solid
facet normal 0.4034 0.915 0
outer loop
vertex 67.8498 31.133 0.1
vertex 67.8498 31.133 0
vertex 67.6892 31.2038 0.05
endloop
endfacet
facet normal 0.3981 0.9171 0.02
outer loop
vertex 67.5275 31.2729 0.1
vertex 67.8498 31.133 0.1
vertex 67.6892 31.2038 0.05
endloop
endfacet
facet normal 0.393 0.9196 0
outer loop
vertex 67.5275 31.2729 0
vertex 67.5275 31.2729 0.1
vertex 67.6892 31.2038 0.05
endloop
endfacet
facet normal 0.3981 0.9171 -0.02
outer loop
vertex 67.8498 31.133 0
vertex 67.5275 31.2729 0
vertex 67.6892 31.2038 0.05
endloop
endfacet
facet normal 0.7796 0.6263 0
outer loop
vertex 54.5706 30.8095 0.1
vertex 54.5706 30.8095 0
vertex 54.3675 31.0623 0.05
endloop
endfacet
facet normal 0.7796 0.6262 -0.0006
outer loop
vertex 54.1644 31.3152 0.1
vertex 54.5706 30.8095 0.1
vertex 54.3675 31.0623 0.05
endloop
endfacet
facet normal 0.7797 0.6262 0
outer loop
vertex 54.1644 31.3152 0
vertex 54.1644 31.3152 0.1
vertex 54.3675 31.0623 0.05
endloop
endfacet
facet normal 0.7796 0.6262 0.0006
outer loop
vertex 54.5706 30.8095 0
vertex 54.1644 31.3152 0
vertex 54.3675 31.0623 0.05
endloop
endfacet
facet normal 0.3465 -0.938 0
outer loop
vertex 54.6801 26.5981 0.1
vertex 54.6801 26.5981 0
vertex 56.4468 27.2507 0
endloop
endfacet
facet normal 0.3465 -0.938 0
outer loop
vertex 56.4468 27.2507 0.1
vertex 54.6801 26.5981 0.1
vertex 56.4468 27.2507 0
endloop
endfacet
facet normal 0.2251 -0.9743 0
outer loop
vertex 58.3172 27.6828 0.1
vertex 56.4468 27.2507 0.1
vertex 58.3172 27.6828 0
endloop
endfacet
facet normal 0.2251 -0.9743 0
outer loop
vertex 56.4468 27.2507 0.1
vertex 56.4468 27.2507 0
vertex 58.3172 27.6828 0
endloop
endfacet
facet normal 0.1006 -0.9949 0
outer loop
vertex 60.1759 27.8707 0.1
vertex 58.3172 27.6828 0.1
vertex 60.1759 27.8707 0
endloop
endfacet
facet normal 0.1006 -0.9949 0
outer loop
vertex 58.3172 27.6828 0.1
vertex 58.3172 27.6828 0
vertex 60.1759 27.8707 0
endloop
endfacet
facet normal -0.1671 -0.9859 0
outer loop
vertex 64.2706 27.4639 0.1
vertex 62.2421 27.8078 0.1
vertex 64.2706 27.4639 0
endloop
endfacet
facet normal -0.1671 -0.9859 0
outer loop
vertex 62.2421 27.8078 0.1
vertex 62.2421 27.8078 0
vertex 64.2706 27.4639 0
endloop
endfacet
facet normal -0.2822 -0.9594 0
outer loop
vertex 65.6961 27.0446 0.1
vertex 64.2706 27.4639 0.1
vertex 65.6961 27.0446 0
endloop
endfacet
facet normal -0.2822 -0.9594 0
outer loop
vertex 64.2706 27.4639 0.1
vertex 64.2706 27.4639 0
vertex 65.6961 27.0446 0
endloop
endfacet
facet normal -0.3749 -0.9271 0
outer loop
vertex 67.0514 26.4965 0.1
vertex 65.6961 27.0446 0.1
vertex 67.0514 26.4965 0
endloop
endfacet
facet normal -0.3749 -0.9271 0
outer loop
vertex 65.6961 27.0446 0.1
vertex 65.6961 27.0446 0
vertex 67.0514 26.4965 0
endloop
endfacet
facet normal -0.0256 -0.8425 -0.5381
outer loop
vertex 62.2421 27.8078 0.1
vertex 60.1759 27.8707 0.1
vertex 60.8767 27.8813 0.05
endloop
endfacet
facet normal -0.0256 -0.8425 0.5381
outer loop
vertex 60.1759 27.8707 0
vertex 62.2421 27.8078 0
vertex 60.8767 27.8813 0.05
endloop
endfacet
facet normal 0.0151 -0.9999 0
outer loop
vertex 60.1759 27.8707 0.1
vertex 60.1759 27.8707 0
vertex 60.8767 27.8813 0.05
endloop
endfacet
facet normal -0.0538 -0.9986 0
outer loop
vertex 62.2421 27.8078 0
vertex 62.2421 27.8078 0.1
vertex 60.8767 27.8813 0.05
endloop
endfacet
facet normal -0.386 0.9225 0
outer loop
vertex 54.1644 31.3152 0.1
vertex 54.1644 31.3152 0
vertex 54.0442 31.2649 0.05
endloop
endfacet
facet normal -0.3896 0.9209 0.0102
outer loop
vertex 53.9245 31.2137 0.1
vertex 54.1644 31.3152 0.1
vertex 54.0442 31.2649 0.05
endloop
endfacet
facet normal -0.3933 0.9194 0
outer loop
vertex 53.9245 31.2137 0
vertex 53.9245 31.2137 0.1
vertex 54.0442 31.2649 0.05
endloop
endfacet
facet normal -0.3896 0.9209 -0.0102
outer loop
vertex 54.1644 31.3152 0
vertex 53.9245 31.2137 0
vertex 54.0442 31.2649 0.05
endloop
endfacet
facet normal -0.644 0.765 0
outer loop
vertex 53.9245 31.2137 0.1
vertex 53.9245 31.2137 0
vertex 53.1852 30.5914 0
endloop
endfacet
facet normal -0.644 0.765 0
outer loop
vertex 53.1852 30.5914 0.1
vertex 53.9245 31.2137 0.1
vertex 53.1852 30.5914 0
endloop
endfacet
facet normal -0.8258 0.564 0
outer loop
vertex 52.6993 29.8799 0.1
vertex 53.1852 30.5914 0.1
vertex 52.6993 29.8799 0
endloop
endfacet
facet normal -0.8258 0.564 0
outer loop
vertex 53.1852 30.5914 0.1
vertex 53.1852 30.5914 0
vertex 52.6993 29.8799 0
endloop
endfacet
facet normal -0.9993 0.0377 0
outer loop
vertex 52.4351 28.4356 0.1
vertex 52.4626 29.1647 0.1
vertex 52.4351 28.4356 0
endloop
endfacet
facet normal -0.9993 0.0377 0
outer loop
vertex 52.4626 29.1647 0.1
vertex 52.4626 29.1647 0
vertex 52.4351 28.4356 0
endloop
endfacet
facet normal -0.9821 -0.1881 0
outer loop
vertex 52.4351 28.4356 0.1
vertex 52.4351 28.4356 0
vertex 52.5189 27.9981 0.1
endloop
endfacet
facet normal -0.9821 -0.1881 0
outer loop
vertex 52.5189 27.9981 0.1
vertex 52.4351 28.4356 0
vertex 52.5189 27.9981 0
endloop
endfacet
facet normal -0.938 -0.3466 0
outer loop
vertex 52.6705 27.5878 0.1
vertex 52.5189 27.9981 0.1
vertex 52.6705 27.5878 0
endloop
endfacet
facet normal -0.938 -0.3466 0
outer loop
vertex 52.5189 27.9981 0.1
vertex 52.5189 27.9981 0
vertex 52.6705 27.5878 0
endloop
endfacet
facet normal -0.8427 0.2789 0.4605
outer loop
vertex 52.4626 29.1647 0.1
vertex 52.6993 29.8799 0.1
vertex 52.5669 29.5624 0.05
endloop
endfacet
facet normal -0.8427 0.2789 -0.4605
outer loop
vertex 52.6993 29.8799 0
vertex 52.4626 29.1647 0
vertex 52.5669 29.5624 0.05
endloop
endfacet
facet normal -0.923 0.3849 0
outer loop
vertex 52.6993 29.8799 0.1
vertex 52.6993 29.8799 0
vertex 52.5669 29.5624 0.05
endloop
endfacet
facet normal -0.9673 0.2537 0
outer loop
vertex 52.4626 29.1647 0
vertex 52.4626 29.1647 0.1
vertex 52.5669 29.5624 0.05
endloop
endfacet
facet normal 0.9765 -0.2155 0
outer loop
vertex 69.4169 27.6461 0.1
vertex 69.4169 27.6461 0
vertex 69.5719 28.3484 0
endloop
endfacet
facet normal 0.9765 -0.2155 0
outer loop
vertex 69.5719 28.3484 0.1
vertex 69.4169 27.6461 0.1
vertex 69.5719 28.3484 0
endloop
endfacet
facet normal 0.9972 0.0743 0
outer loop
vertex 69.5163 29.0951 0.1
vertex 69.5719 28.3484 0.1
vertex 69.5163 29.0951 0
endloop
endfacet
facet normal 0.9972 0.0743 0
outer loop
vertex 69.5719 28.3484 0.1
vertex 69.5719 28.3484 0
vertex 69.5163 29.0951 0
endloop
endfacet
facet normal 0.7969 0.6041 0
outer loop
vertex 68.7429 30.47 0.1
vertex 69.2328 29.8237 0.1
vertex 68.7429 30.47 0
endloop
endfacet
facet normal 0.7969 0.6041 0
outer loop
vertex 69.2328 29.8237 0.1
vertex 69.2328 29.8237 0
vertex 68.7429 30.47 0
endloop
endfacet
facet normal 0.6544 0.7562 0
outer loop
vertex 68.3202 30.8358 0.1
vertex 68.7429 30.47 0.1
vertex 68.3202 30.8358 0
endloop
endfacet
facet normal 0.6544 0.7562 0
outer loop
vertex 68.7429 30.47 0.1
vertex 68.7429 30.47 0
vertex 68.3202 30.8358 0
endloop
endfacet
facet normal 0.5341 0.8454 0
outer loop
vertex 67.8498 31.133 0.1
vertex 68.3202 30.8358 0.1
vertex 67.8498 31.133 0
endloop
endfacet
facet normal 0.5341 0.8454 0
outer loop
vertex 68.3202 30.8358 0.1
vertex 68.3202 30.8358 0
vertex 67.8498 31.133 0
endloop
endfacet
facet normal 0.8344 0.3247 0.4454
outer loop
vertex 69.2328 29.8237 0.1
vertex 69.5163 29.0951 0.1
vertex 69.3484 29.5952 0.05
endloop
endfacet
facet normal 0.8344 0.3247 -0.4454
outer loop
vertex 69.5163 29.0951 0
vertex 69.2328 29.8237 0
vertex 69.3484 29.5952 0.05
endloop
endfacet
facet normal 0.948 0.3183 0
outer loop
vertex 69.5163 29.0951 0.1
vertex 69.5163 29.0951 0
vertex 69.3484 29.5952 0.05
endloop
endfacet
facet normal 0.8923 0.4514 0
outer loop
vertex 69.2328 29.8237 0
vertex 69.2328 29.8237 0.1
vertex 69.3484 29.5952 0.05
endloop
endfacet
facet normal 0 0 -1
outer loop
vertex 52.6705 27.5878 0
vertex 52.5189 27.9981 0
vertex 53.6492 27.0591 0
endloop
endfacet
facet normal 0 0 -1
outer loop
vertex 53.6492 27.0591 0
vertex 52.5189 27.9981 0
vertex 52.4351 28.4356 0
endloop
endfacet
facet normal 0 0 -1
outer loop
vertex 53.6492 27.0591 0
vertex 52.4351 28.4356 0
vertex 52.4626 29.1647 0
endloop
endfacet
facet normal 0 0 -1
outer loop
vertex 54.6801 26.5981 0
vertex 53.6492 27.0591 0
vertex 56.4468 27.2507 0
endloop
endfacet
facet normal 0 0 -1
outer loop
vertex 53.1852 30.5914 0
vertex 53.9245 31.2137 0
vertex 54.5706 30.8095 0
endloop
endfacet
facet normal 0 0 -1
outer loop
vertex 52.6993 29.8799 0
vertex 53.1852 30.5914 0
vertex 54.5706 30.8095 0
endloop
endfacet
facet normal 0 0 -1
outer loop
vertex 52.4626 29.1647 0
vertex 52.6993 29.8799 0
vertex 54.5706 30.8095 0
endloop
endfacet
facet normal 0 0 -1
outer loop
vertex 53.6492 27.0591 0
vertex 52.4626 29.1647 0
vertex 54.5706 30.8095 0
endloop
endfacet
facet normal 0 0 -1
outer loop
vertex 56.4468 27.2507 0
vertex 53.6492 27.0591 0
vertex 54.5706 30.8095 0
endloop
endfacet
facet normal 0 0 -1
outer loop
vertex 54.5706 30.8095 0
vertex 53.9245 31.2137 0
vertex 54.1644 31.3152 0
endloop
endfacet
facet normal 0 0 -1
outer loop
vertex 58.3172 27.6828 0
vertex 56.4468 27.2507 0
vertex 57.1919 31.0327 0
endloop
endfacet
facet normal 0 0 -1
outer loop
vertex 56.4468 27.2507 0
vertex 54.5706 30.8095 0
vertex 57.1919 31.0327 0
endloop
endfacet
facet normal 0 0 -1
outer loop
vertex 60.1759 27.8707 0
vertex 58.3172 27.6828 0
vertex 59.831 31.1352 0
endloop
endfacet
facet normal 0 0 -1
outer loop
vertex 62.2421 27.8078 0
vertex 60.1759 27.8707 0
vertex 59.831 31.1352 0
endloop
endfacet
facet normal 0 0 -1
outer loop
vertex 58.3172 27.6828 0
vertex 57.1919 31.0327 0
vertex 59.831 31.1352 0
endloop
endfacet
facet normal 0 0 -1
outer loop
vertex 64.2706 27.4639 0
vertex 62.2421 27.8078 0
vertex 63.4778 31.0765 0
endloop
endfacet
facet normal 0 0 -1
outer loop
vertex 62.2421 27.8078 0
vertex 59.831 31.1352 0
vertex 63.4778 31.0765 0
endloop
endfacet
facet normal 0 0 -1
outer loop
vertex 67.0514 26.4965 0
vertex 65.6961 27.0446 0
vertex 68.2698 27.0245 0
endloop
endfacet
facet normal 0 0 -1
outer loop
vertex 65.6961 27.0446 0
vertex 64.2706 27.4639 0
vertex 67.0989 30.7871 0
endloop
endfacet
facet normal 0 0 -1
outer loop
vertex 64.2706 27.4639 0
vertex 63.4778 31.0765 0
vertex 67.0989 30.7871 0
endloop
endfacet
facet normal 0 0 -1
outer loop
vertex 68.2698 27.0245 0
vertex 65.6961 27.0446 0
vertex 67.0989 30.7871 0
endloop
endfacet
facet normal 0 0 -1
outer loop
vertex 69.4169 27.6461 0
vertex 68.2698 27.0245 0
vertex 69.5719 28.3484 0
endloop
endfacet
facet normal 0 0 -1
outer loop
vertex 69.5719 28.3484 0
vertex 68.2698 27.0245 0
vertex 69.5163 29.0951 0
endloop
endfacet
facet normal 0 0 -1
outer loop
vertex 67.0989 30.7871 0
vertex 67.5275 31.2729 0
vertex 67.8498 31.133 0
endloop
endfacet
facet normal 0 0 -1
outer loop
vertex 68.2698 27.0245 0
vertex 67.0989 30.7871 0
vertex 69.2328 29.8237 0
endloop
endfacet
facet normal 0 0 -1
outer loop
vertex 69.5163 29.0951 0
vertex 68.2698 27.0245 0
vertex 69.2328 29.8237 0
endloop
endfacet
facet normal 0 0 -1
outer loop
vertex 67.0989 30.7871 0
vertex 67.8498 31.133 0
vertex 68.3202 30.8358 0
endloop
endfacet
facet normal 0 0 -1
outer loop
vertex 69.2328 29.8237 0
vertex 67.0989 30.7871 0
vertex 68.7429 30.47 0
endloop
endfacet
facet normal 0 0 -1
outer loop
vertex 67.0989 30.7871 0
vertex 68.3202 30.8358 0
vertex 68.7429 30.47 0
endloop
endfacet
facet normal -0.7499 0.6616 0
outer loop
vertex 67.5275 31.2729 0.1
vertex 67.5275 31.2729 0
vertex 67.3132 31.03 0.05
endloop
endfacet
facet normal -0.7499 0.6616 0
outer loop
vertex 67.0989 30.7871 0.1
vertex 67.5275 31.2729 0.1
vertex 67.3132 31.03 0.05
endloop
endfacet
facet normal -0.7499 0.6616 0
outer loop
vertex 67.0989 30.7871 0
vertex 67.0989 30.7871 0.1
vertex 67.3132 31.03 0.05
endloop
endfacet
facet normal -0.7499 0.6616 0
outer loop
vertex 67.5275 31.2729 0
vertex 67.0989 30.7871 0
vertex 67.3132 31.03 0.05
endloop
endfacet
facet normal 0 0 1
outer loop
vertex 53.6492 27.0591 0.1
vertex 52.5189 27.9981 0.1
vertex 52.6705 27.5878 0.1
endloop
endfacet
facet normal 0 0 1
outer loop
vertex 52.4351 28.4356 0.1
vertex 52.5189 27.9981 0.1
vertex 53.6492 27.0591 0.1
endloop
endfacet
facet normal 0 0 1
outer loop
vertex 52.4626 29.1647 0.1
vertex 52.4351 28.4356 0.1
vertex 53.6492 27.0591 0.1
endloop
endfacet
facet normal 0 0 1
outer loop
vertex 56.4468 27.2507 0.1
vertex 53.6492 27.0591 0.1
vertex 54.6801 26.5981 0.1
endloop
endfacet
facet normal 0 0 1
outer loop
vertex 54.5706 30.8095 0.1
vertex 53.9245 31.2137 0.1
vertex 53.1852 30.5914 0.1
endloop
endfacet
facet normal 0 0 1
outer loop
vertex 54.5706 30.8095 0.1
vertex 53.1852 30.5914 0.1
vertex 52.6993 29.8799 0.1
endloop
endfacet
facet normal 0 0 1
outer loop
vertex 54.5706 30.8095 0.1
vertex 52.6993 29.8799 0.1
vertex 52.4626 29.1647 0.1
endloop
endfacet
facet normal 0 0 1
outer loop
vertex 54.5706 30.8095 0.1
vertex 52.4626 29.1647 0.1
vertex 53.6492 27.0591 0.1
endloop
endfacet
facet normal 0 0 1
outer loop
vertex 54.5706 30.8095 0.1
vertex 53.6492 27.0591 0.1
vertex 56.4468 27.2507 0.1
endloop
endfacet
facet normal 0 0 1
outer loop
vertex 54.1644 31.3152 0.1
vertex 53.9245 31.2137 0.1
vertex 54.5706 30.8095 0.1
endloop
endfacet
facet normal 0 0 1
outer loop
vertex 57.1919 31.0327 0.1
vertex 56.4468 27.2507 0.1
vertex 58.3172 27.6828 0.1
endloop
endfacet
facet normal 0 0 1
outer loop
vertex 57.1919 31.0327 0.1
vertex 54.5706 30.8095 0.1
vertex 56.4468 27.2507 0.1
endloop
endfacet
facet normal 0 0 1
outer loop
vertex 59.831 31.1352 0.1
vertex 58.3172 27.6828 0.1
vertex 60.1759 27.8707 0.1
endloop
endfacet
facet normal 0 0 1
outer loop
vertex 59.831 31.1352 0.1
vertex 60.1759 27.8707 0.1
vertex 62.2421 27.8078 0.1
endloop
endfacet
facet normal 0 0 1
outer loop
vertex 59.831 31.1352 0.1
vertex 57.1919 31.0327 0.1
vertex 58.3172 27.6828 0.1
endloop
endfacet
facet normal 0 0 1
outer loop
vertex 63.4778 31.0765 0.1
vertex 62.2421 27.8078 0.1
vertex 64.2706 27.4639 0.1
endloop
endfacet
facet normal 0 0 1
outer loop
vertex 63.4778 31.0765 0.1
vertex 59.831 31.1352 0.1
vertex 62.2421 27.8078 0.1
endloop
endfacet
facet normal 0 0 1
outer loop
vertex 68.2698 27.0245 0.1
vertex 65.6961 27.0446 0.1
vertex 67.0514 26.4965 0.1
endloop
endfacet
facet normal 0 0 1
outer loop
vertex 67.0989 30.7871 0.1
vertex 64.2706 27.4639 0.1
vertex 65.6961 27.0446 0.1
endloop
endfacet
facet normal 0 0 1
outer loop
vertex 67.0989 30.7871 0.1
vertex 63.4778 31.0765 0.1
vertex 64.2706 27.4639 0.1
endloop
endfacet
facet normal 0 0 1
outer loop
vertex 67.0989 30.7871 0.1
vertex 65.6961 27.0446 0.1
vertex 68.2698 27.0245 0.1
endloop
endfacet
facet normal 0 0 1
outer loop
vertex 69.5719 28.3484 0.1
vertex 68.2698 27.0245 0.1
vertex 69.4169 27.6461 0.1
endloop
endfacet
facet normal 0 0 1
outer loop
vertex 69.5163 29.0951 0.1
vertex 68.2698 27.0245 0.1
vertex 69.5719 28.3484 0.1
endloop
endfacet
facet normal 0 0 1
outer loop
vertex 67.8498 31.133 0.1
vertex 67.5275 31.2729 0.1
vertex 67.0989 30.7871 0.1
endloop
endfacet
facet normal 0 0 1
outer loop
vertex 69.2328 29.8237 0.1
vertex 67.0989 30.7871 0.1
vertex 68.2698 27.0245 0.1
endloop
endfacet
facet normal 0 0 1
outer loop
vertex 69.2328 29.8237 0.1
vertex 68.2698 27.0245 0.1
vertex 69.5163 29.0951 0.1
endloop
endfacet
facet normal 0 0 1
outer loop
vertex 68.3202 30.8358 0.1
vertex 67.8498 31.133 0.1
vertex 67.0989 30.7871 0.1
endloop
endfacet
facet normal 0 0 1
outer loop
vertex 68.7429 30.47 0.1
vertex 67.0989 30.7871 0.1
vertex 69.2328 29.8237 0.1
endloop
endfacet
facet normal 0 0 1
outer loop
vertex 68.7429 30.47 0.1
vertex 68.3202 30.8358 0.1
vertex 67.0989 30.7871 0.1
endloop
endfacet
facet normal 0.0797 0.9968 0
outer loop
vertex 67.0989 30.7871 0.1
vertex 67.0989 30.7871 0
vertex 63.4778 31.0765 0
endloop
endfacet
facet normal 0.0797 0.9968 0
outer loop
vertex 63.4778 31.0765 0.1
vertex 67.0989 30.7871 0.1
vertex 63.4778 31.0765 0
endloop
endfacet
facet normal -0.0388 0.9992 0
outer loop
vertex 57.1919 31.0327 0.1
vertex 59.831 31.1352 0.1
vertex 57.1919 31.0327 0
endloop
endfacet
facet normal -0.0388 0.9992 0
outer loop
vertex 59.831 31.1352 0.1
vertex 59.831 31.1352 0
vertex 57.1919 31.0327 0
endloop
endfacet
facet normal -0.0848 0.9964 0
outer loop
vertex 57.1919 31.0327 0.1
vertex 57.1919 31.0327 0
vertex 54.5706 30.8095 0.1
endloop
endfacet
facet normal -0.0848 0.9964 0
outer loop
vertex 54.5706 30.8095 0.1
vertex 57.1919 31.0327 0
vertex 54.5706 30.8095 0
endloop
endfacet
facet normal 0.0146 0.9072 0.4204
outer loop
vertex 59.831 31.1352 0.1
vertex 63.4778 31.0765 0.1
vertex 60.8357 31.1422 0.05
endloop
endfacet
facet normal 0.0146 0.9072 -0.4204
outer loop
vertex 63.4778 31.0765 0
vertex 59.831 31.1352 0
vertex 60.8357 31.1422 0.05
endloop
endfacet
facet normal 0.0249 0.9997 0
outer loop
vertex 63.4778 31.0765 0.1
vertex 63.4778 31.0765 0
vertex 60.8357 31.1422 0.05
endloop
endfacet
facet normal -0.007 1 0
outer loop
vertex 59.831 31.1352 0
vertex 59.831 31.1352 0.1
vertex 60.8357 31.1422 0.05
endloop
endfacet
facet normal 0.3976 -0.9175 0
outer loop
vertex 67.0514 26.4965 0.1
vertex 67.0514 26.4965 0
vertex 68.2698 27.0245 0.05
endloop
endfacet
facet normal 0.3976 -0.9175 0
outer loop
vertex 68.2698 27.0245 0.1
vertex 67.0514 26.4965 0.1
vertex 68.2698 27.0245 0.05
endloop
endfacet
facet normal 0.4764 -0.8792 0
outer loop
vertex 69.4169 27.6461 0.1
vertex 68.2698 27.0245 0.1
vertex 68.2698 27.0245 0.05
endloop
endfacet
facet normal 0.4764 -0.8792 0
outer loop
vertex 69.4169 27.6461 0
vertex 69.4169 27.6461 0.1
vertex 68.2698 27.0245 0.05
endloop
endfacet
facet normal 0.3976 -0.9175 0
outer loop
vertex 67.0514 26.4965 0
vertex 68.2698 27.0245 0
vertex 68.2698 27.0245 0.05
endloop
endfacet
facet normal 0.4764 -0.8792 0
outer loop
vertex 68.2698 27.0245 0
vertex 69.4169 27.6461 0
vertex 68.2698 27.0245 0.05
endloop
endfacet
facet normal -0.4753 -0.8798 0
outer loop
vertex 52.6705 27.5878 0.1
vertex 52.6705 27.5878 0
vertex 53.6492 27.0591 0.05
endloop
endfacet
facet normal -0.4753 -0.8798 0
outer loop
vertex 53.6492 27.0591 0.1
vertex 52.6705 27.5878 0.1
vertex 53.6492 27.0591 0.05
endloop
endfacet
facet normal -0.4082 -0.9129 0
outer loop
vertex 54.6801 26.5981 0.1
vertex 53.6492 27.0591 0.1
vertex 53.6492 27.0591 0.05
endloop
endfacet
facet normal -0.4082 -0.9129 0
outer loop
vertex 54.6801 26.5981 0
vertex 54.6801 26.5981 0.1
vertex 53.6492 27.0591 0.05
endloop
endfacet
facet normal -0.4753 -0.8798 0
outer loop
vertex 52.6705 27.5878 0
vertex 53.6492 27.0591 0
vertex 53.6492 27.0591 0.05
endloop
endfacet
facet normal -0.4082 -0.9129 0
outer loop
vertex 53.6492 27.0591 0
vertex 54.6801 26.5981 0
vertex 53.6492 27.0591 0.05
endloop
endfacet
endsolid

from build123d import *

# Parameters (mm, degrees)
SALIENTE_EXTRUIR1_DEPTH = 0.1


with BuildPart() as part:
    # Model → Saliente-Extruir1 (new body)
    with BuildSketch(Plane.XY):
        with BuildLine():
            add(Edge.make_bspline(
                [(54.570583832, 30.809459397), (54.367516513, 31.062309536), (54.164449193, 31.315159675)],
                knots=[5.050094229, 5.050094229, 5.050094229, 6.050094229, 6.050094229, 6.050094229], degree=2, weights=[1, 1, 1]))
            add(Edge.make_bspline(
                [(54.164449193, 31.315159675), (54.043855277, 31.265315881), (53.924453385, 31.213668077)],
                knots=[0, 0, 0, 0.018791538, 0.018791538, 0.018791538], degree=2, weights=[1, 0.99995586, 1]))
            add(Edge.make_bspline(
                [(53.924453385, 31.213668077), (51.666875483, 29.761650164), (52.670517155, 27.587817765)],
                knots=[0.018791538, 0.018791538, 0.018791538, 1.266242996, 1.266242996, 1.266242996], degree=2, weights=[1, 0.811708033, 1]))
            add(Edge.make_bspline(
                [(52.670517155, 27.587817765), (53.62304942, 27.025028989), (54.680131861, 26.59810553)],
                knots=[1.266242996, 1.266242996, 1.266242996, 1.434861453, 1.434861453, 1.434861453], degree=2, weights=[1, 0.996448082, 1]))
            add(Edge.make_bspline(
                [(54.680131861, 26.59810553), (60.888771996, 29.345532705), (67.05144986, 26.496503052)],
                knots=[1.434861453, 1.434861453, 1.434861453, 2.28451346, 2.28451346, 2.28451346], degree=2, weights=[1, 0.911110461, 1]))
            add(Edge.make_bspline(
                [(67.05144986, 26.496503052), (68.305506812, 26.977392792), (69.416942944, 27.646101117)],
                knots=[2.28451346, 2.28451346, 2.28451346, 2.482363868, 2.482363868, 2.482363868], degree=2, weights=[1, 0.995110891, 1]))
            add(Edge.make_bspline(
                [(69.416942944, 27.646101117), (70.236120065, 29.850566621), (67.849759205, 31.132955517)],
                knots=[2.482363868, 2.482363868, 2.482363868, 3.750620329, 3.750620329, 3.750620329], degree=2, weights=[1, 0.805588504, 1]))
            add(Edge.make_bspline(
                [(67.849759205, 31.132955517), (67.689744673, 31.204586758), (67.527509068, 31.272945811)],
                knots=[3.750620329, 3.750620329, 3.750620329, 3.77600443, 3.77600443, 3.77600443], degree=2, weights=[1, 0.999919457, 1]))
            add(Edge.make_bspline(
                [(67.527509068, 31.272945811), (67.313211267, 31.030007557), (67.098913467, 30.787069303)],
                knots=[3.77600443, 3.77600443, 3.77600443, 4.77600443, 4.77600443, 4.77600443], degree=2, weights=[1, 1, 1]))
            add(Edge.make_bspline(
                [(67.098913467, 30.787069303), (60.836678527, 31.489373894), (54.570583832, 30.809459397)],
                knots=[4.77600443, 4.77600443, 4.77600443, 5.050094229, 5.050094229, 5.050094229], degree=2, weights=[1, 0.990624036, 1]))
        make_face()
    extrude(amount=SALIENTE_EXTRUIR1_DEPTH)


solid = part.part
